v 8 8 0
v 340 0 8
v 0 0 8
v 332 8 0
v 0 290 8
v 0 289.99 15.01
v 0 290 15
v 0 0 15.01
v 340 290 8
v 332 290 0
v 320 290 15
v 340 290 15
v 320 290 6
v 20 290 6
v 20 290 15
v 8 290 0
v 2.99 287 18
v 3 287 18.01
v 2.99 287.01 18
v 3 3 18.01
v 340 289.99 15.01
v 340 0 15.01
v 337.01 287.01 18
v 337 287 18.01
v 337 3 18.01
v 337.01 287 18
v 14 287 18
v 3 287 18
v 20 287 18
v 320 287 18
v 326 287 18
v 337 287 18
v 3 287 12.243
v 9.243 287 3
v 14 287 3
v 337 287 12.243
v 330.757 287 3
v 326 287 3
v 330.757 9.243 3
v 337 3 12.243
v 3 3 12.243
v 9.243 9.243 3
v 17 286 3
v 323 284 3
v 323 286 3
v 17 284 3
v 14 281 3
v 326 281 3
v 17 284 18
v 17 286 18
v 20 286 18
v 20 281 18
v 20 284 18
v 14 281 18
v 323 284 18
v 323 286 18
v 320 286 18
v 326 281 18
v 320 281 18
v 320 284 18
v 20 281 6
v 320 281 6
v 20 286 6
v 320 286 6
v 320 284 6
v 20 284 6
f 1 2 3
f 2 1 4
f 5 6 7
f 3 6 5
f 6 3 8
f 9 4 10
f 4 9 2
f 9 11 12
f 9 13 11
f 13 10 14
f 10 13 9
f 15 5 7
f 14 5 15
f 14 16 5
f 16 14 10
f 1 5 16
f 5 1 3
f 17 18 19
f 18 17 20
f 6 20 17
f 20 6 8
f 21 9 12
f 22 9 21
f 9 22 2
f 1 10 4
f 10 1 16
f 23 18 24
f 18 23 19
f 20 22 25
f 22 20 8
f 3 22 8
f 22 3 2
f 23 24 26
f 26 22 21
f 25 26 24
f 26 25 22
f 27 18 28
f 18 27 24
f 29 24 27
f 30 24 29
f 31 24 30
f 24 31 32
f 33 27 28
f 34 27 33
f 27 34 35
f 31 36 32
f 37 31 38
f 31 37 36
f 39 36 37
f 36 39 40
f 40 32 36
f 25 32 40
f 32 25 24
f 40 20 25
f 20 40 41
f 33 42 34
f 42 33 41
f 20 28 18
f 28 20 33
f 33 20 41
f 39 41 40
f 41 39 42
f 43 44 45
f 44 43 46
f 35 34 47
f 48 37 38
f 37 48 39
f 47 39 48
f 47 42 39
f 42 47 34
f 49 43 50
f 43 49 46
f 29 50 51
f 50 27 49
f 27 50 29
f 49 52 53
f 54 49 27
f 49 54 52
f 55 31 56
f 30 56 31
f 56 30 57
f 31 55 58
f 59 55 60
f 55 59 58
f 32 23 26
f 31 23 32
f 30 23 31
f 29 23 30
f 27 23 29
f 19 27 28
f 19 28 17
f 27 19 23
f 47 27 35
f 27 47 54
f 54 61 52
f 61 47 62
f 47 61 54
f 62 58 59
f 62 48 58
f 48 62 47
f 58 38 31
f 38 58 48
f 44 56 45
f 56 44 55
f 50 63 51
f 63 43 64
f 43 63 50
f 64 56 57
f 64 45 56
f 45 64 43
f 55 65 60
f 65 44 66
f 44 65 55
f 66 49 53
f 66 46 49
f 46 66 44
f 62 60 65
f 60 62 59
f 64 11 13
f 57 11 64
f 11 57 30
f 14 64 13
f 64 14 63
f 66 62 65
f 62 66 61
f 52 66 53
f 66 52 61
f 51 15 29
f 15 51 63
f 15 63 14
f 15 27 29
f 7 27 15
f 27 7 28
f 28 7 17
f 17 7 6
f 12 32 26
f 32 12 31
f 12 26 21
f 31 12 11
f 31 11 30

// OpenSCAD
// Juku bottom case
// Units: millimeters

outside_width = 340;
outside_depth = 290;
outside_height = 18;
case_thickness = 3;
bottom_chamfer = 8;
top_edge_chamfer = 3;
rear_pcb_opening_width = 300;
rear_pcb_opening_height = 12;
rear_outer_rail_depth = 4;
rear_rail_gap = 2;
rear_inner_rail_depth = 3;
rear_inner_rail_length = rear_pcb_opening_width + 2 * case_thickness;
rear_outer_rail_length = rear_inner_rail_length + 2 * case_thickness;
rear_rail_base_z = case_thickness;
rear_rail_height = outside_height - rear_rail_base_z;
rear_rail_end_length = (rear_outer_rail_length - rear_inner_rail_length) / 2;
rear_guide_y_offset = case_thickness;

cut_overlap = 0.01;
inner_chamfer_offset = case_thickness * sqrt(2);
inner_chamfer_end_z = bottom_chamfer + inner_chamfer_offset;
rear_pcb_opening_x = (outside_width - rear_pcb_opening_width) / 2;
rear_pcb_opening_z = outside_height - rear_pcb_opening_height;
rear_inner_rail_x = (outside_width - rear_inner_rail_length) / 2;
rear_outer_rail_x = (outside_width - rear_outer_rail_length) / 2;
rear_outer_rail_y =
    outside_depth - case_thickness - rear_outer_rail_depth
    + rear_guide_y_offset;
rear_inner_rail_y =
    rear_outer_rail_y - rear_rail_gap - rear_inner_rail_depth;

assert(case_thickness > 0);
assert(2 * case_thickness < outside_width);
assert(2 * case_thickness < outside_depth);
assert(case_thickness < outside_height);
assert(bottom_chamfer > 0);
assert(inner_chamfer_end_z < outside_height);
assert(top_edge_chamfer > 0);
assert(top_edge_chamfer <= case_thickness);
assert(bottom_chamfer < outside_height - top_edge_chamfer);
assert(rear_pcb_opening_width > 0);
assert(rear_pcb_opening_width < outside_width);
assert(rear_pcb_opening_height > 0);
assert(rear_pcb_opening_height < outside_height);
assert(rear_outer_rail_depth > 0);
assert(rear_rail_gap > 0);
assert(rear_inner_rail_depth > 0);
assert(rear_inner_rail_length < outside_width);
assert(rear_outer_rail_length < outside_width);
assert(rear_rail_base_z + rear_rail_height <= outside_height);
assert(rear_rail_base_z < rear_pcb_opening_z);
assert(rear_rail_end_length > 0);

module section(width, depth, x, y, z) {
    translate([x, y, z])
        cube([width, depth, cut_overlap]);
}

module outside_shape() {
    hull() {
        section(
            outside_width - 2 * bottom_chamfer,
            outside_depth - bottom_chamfer,
            bottom_chamfer,
            bottom_chamfer,
            0
        );

        section(outside_width, outside_depth, 0, 0, bottom_chamfer);
        section(
            outside_width,
            outside_depth,
            0,
            0,
            outside_height - top_edge_chamfer
        );
        section(
            outside_width - 2 * top_edge_chamfer,
            outside_depth - 2 * top_edge_chamfer,
            top_edge_chamfer,
            top_edge_chamfer,
            outside_height
        );
    }
}

module inside_cutout() {
    lower_inset = bottom_chamfer + inner_chamfer_offset - case_thickness;

    hull() {
        section(
            outside_width - 2 * lower_inset,
            outside_depth - lower_inset - case_thickness,
            lower_inset,
            lower_inset,
            case_thickness
        );

        section(
            outside_width - 2 * case_thickness,
            outside_depth - 2 * case_thickness,
            case_thickness,
            case_thickness,
            inner_chamfer_end_z
        );

        section(
            outside_width - 2 * case_thickness,
            outside_depth - 2 * case_thickness,
            case_thickness,
            case_thickness,
            outside_height + cut_overlap
        );
    }
}

module rear_pcb_opening() {
    translate([
        rear_pcb_opening_x,
        rear_inner_rail_y - cut_overlap,
        rear_pcb_opening_z
    ])
        cube([
            rear_pcb_opening_width,
            outside_depth - rear_inner_rail_y + 2 * cut_overlap,
            rear_pcb_opening_height
        ]);
}

module rear_pcb_guide_rails() {
    translate([
        rear_outer_rail_x,
        rear_outer_rail_y,
        rear_rail_base_z
    ])
        cube([
            rear_outer_rail_length,
            rear_outer_rail_depth,
            rear_rail_height
        ]);

    translate([
        rear_inner_rail_x,
        rear_inner_rail_y,
        rear_rail_base_z
    ])
        cube([
            rear_inner_rail_length,
            rear_inner_rail_depth,
            rear_rail_height
        ]);

    for (x = [rear_outer_rail_x, rear_inner_rail_x + rear_inner_rail_length]) {
        translate([
            x,
            rear_inner_rail_y,
            rear_rail_base_z
        ])
            cube([
                rear_rail_end_length,
                rear_outer_rail_y + rear_outer_rail_depth - rear_inner_rail_y,
                rear_rail_height
            ]);
    }
}

module rear_top_edge_chamfer_cut() {
    translate([-cut_overlap, 0, 0])
        multmatrix([
            [0, 0, 1, 0],
            [1, 0, 0, 0],
            [0, 1, 0, 0],
            [0, 0, 0, 1]
        ])
            linear_extrude(height = outside_width + 2 * cut_overlap)
                polygon([
                    [
                        outside_depth - top_edge_chamfer,
                        outside_height
                    ],
                    [
                        outside_depth,
                        outside_height - top_edge_chamfer
                    ],
                    [
                        outside_depth,
                        outside_height
                    ]
                ]);
}

module bottom_case() {
    difference() {
        union() {
            difference() {
                outside_shape();
                inside_cutout();
            }

            rear_pcb_guide_rails();
        }

        rear_pcb_opening();
        rear_top_edge_chamfer_cut();
    }
}

bottom_case();
